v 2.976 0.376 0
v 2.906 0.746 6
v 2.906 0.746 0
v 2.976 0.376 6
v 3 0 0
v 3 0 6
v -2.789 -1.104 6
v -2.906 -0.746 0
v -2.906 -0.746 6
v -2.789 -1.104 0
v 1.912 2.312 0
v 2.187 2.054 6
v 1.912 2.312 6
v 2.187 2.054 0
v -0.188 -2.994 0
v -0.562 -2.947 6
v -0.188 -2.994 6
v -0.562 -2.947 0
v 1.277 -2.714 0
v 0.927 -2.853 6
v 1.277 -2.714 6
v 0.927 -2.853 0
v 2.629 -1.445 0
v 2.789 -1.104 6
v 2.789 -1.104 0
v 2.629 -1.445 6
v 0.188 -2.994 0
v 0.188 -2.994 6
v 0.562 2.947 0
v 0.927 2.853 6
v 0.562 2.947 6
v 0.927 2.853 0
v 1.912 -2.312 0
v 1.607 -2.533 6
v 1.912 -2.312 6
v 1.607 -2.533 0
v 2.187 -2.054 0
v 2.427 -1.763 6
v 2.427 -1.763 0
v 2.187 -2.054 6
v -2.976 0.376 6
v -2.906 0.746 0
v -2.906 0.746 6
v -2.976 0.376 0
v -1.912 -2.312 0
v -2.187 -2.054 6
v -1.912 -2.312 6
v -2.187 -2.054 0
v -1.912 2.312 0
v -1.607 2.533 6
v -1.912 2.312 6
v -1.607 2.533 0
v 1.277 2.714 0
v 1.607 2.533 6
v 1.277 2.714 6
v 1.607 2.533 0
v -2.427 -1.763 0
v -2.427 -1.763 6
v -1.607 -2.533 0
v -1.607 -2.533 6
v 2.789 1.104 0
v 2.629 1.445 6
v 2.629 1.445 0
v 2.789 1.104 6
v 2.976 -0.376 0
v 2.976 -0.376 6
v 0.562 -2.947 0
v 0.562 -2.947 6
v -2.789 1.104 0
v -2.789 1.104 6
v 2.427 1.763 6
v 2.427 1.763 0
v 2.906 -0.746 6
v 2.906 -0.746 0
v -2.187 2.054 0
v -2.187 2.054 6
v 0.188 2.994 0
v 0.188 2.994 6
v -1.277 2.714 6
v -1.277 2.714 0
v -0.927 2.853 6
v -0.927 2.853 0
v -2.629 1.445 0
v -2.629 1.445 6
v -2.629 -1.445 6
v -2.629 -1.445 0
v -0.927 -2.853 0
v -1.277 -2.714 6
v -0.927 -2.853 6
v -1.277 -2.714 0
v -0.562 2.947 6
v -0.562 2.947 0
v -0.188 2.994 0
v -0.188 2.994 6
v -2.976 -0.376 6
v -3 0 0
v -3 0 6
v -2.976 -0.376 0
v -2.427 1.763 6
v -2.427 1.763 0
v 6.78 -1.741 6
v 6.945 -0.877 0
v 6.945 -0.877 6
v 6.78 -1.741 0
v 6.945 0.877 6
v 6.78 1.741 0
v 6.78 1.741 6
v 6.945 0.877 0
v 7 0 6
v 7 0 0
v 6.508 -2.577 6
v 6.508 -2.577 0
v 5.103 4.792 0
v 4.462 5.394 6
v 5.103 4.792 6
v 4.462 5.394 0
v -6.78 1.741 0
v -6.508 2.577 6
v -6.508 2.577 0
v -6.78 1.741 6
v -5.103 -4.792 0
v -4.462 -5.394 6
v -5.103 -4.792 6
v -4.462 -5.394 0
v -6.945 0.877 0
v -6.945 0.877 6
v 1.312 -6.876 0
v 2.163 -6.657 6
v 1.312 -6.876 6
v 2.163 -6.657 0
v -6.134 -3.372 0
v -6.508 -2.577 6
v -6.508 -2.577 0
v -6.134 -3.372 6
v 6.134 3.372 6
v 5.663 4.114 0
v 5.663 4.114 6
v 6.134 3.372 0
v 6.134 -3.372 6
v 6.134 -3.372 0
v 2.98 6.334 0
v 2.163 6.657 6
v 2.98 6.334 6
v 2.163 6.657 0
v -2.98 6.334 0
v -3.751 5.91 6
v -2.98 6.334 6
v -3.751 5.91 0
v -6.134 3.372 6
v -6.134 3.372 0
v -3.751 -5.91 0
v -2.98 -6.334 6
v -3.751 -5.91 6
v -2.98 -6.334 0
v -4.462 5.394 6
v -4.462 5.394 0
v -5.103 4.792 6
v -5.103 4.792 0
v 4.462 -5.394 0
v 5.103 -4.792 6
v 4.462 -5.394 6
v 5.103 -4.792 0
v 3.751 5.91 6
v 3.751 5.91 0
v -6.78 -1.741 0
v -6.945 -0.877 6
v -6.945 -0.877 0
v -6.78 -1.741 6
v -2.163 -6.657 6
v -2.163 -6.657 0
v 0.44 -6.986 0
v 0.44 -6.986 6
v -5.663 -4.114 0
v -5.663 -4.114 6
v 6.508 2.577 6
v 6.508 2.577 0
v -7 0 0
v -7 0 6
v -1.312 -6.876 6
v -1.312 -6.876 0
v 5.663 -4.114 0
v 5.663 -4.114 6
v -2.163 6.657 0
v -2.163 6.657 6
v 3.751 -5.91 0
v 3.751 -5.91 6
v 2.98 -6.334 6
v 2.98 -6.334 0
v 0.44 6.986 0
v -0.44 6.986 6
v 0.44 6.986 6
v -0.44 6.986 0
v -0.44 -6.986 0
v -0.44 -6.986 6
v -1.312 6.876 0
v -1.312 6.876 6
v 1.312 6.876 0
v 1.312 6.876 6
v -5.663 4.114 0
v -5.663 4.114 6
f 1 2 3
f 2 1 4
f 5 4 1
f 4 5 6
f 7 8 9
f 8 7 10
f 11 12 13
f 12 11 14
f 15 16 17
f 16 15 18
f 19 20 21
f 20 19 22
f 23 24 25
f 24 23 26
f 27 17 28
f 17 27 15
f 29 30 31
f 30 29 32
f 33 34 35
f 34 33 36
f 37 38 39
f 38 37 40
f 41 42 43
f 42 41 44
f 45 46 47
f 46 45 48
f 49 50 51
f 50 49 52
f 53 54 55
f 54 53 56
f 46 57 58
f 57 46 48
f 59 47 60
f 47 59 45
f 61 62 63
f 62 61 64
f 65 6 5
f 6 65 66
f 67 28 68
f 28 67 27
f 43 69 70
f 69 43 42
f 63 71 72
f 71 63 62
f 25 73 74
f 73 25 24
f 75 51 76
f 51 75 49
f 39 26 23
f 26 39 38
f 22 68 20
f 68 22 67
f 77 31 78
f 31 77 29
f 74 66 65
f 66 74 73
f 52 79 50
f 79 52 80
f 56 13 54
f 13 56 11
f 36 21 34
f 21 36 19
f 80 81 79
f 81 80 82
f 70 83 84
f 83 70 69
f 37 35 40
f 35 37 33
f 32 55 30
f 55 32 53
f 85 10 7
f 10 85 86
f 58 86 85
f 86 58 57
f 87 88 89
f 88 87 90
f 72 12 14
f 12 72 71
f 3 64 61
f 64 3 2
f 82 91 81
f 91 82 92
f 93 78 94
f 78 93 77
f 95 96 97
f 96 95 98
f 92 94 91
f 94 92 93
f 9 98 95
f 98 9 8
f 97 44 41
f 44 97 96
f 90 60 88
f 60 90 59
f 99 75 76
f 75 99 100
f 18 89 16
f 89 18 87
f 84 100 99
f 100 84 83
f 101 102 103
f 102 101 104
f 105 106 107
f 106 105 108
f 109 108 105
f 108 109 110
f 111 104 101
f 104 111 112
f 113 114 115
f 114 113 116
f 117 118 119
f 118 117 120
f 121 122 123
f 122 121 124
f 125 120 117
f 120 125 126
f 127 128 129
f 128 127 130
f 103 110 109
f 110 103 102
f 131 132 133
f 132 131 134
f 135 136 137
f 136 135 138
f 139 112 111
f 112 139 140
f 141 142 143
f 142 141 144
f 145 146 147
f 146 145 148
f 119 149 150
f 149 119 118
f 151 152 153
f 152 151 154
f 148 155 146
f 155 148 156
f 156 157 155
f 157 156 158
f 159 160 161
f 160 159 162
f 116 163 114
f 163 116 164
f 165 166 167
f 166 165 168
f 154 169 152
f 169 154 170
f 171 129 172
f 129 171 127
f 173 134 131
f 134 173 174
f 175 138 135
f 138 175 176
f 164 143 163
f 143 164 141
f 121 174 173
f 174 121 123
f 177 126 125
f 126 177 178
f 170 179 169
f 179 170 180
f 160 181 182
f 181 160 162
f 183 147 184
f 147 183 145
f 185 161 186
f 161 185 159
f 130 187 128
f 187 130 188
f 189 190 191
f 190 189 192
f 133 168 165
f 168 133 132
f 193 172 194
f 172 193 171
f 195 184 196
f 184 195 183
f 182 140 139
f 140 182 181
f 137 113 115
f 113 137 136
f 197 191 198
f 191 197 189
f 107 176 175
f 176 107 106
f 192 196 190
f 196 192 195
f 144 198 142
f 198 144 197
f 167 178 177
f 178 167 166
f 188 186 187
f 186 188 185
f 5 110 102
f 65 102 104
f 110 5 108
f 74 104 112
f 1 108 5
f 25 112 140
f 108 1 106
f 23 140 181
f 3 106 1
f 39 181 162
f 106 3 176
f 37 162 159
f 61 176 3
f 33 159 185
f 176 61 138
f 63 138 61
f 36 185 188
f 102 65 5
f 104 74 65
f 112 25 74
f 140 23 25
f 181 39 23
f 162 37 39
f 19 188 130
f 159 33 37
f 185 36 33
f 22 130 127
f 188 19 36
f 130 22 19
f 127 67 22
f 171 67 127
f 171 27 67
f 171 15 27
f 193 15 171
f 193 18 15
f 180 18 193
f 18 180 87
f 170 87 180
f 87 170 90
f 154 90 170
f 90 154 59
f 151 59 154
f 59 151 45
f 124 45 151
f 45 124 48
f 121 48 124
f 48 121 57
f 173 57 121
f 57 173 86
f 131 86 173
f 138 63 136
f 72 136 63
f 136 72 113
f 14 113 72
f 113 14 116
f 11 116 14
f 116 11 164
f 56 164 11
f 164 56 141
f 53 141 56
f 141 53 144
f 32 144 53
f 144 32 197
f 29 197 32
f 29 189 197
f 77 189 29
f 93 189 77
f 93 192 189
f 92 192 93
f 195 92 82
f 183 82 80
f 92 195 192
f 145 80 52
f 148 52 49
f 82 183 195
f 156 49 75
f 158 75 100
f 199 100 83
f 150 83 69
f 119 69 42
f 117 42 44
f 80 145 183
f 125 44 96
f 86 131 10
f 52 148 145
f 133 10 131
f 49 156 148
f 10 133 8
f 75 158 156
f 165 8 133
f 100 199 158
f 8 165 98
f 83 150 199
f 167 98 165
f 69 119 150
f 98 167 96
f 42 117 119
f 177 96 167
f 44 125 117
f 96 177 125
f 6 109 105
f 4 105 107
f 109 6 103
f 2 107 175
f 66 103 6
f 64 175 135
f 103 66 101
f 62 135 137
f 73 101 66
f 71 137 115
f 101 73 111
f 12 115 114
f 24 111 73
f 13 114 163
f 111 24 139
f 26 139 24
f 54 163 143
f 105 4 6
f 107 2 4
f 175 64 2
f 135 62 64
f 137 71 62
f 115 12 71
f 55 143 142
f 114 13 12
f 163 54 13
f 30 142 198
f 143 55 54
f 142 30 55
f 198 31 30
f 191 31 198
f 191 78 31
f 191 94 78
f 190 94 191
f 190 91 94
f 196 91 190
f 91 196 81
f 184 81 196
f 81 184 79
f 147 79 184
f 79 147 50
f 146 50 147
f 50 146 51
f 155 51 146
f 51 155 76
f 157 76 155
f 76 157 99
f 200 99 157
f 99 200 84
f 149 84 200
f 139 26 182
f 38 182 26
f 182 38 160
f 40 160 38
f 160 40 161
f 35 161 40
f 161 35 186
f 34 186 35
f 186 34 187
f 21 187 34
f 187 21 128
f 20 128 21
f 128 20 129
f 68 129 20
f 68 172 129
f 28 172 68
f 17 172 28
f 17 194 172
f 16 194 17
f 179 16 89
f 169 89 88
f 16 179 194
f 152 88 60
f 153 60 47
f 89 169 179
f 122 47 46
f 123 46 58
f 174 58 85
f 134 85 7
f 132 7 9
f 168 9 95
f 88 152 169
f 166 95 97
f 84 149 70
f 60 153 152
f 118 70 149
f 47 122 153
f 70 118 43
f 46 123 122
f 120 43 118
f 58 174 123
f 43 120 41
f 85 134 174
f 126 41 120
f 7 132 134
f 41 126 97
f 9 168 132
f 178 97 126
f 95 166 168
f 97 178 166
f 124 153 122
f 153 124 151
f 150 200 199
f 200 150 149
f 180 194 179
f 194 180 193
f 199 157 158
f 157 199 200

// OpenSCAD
$fn = 50;


difference() {
	union() {
		*color(alpha = 1.0000000000, c = "gray") {
			translate(v = [0, 7, 0]) {
				linear_extrude(height = 1) {
					text(font = "Arial:style=Bold", halign = "center", size = 4.5000000000, text = "COMMENT plate main", valign = "center");
				}
			}
		}
		cylinder(h = 6, r = 7.0000000000);
	}
	union() {
		*color(alpha = 1.0000000000, c = "gray") {
			translate(v = [0, 7, 0]) {
				linear_extrude(height = 1) {
					text(font = "Arial:style=Bold", halign = "center", size = 4.5000000000, text = "COMMENT holes main", valign = "center");
				}
			}
		}
		translate(v = [0, 0, -100]) {
			cylinder(h = 200, r = 3.0000000000);
		}
		translate(v = [0, 0, -100]) {
			cylinder(h = 200, r = 1.5000000000);
		}
	}
}
